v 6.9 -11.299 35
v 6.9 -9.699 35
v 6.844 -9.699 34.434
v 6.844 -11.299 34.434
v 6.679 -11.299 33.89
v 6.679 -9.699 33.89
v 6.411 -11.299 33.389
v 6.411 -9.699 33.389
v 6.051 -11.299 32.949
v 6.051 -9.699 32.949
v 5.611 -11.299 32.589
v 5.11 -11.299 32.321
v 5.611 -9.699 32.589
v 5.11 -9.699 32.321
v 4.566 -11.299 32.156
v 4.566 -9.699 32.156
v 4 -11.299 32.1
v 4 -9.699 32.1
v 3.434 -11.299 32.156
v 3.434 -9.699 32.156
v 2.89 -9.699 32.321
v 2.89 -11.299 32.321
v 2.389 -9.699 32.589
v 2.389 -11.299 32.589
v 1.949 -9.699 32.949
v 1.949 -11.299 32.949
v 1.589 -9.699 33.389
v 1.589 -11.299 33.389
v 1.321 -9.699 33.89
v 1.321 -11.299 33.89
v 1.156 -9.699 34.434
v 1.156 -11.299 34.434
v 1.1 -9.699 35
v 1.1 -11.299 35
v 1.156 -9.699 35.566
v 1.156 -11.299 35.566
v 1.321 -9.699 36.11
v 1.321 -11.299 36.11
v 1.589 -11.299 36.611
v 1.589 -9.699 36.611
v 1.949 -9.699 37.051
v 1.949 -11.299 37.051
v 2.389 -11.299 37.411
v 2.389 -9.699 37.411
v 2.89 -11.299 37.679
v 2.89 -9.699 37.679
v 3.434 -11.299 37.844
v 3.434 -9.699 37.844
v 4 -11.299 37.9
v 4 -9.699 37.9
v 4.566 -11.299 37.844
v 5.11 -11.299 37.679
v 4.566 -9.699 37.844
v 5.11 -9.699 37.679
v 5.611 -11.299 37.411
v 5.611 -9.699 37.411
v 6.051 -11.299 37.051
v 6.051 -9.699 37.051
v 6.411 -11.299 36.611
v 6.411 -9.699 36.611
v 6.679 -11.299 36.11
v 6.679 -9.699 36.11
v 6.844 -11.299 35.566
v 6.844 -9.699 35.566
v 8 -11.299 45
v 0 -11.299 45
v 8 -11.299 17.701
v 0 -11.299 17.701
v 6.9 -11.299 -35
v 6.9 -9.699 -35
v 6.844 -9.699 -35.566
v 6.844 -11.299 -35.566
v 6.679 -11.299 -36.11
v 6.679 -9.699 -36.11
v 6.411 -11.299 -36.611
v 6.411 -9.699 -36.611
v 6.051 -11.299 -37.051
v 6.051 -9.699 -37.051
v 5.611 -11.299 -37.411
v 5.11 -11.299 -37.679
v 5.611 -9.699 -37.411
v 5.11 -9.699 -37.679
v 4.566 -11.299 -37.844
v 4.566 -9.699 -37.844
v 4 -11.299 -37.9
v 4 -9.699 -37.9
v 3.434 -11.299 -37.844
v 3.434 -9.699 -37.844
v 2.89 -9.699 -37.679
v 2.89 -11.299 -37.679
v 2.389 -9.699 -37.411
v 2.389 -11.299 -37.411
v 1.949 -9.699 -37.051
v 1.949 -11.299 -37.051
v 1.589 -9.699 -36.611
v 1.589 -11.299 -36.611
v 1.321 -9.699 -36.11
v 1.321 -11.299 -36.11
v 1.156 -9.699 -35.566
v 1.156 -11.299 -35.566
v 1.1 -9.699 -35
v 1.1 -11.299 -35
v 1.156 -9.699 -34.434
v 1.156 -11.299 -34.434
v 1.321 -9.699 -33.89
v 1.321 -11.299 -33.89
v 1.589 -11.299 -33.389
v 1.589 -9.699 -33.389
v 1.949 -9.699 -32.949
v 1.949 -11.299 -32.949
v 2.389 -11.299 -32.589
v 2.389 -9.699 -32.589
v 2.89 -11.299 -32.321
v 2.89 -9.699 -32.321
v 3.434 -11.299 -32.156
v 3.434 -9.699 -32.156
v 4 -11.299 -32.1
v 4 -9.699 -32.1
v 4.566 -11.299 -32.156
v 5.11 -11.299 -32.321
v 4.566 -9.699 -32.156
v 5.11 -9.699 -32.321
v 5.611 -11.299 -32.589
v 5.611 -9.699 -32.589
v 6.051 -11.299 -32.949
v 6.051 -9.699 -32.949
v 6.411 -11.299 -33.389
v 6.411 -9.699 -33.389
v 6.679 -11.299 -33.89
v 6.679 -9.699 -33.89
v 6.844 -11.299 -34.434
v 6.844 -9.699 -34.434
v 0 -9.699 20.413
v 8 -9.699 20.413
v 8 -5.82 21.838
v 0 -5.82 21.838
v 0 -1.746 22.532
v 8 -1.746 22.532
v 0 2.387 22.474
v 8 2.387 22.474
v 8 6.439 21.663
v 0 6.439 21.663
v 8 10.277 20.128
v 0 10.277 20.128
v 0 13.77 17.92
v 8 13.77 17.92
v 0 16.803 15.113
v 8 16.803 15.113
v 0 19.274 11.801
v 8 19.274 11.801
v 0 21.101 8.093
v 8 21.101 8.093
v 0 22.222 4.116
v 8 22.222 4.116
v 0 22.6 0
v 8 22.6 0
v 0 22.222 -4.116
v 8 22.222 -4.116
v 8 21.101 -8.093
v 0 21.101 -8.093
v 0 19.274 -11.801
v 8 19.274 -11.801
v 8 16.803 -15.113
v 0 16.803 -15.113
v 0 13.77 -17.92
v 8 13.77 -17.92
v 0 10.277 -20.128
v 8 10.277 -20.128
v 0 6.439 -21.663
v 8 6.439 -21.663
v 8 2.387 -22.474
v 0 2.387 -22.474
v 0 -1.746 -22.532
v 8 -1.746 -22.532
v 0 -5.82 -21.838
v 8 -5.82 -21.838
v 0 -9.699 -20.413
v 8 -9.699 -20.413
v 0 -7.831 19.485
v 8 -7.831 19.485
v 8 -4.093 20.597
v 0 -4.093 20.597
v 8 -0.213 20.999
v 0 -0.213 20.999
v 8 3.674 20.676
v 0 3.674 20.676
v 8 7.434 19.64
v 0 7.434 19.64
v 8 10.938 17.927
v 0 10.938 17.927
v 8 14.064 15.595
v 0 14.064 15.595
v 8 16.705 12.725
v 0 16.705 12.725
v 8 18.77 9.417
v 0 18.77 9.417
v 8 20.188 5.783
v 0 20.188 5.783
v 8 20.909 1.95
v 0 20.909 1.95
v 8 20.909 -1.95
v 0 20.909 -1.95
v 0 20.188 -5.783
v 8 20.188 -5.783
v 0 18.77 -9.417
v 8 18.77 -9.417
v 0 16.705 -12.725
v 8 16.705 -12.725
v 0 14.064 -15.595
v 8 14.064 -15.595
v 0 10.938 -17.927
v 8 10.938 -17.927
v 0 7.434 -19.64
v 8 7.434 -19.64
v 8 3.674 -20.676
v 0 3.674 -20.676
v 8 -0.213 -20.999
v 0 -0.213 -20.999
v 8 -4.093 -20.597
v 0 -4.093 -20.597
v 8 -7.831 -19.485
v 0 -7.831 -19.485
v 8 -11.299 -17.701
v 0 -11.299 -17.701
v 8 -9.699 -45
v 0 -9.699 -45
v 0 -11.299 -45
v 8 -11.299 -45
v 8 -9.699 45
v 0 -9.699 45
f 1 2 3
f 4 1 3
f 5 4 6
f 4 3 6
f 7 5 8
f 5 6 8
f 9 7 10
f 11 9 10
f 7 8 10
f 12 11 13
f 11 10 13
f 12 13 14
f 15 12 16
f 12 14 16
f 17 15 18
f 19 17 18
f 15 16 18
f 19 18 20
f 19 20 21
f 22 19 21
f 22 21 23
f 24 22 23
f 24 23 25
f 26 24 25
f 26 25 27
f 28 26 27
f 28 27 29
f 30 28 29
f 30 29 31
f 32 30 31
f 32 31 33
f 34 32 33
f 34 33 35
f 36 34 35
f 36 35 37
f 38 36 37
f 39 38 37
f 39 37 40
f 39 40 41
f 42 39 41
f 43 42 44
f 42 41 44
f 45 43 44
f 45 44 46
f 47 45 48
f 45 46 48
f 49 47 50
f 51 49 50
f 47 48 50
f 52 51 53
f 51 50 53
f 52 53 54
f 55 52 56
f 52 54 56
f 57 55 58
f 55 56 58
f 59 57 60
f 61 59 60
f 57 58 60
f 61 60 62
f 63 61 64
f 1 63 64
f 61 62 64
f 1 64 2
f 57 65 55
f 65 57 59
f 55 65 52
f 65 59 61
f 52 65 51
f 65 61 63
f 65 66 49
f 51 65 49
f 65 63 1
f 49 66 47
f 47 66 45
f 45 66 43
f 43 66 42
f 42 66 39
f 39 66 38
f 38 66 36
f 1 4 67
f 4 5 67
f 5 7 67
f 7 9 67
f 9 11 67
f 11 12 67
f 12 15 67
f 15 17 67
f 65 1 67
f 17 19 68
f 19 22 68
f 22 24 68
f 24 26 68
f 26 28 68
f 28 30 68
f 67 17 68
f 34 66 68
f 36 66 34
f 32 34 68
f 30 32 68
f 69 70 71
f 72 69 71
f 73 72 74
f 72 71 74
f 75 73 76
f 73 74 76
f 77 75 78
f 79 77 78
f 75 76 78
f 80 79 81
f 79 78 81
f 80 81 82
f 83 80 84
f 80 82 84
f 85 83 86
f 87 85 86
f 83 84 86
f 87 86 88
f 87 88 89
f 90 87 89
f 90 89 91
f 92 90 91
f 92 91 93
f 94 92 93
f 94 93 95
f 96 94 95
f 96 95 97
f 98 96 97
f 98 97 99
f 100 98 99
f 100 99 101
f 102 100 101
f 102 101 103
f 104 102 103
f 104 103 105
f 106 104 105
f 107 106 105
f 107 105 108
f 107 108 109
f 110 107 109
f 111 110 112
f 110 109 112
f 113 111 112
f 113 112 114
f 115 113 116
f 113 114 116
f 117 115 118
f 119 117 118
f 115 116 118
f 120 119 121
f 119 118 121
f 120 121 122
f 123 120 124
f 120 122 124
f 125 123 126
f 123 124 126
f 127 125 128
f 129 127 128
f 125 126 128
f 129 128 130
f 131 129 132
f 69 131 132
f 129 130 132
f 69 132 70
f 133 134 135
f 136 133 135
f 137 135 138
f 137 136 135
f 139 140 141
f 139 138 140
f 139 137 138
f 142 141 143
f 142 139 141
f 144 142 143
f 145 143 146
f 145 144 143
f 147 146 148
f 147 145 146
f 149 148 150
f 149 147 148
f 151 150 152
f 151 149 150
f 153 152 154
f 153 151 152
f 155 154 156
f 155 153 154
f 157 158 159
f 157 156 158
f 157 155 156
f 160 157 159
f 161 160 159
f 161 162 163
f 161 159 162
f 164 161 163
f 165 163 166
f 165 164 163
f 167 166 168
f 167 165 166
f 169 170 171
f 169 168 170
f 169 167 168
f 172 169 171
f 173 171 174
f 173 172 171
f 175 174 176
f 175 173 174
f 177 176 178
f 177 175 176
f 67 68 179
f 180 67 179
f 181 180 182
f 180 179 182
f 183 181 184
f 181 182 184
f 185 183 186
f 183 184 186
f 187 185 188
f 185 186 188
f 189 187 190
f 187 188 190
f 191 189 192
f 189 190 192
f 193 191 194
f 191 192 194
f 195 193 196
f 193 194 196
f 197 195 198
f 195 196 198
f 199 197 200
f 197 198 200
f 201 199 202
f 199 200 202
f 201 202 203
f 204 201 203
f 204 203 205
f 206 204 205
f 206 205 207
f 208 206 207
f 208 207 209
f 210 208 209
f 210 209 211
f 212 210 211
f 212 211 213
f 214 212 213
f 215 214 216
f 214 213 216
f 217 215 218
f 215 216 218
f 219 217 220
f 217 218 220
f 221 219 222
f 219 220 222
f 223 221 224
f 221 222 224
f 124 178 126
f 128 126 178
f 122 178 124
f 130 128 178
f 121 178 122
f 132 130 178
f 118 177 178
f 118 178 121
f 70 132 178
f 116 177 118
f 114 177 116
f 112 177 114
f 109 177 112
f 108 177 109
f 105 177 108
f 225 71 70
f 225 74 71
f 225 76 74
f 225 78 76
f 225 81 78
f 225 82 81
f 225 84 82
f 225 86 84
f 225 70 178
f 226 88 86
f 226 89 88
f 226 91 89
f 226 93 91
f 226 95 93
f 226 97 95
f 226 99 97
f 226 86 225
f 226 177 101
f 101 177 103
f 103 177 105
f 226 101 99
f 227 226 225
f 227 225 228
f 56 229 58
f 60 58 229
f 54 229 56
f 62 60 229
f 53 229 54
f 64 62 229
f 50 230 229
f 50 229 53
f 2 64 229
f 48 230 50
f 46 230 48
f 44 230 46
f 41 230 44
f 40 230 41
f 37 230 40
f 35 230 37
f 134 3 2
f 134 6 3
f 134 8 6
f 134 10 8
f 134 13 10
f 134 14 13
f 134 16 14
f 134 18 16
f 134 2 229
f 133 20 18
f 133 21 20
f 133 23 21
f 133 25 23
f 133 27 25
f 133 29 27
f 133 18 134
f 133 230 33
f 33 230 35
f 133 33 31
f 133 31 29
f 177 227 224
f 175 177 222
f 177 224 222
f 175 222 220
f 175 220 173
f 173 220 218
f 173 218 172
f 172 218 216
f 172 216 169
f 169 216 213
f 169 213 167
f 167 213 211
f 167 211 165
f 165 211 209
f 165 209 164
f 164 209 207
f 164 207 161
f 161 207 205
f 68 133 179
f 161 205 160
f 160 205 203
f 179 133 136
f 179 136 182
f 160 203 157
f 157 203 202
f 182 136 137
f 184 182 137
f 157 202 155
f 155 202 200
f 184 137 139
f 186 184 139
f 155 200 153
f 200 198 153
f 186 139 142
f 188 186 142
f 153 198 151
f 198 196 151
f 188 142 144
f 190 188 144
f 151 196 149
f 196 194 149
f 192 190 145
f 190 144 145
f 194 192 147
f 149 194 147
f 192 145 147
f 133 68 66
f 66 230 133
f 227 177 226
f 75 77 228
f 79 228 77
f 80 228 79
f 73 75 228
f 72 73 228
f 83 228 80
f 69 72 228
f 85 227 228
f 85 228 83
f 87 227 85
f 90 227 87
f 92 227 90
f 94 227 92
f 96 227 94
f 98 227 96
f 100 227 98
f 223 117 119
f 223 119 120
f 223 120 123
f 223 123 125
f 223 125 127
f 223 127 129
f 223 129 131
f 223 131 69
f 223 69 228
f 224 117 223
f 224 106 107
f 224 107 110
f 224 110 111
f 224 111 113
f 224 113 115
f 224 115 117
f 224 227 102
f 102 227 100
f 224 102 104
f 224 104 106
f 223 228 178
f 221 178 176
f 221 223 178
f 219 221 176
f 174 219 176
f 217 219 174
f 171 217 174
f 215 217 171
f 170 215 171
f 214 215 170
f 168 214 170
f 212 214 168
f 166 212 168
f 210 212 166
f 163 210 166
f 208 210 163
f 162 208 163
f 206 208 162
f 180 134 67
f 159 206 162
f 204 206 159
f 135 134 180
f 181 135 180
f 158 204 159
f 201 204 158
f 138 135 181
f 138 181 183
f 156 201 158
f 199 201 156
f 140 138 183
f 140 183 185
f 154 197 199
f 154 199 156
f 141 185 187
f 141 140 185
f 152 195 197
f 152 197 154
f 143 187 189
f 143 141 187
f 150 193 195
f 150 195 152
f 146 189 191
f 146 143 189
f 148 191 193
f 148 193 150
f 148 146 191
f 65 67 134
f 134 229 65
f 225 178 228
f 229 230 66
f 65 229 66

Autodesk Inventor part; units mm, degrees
ref_plane "YZ Plane" through (0, 0, 0) normal (1, 0, 0) x (0, 1, 0)
ref_plane "XZ Plane" through (0, 0, 0) normal (0, 1, 0) x (-1, 0, 0)
ref_plane "XY Plane" through (0, 0, 0) normal (0, 0, 1) x (1, 0, 0)
sketch "Sketch9" plane through (0, 0, 0) normal (1, 0, 0) x (0, 1, 0)
  arc A0 (-11.2991, -17.7011) -> (-11.2991, 17.7011) centre (0, 0) ccw
  arc A1 (-9.6991, -20.4129) -> (-9.6991, 20.4129) centre (0, 0) ccw
  line L0 (-9.6991, 45) -> (-11.2991, 45)
  line L1 (-11.2991, 45) -> (-11.2991, 17.7011)
  line L2 (-9.6991, 0) -> (-16.1126, 0) construction
  line L3 (-9.6991, -45) -> (-11.2991, -45)
  line L4 (-11.2991, -45) -> (-11.2991, -17.7011)
  line L5 (-9.6991, 45) -> (-9.6991, 18.626)
  line L6 (-9.6991, -18.626) -> (-9.6991, -45)
  dimension "d36" = 42
  dimension "d37" = 45.2
  dimension "d38" = 90
  dimension "d39" = 45
  dimension "d40" = 1.6
extrude "Extrusion5" add sketch "Sketch9" along normal blind 8
sketch "Sketch10" plane through (0, -9.6991, 45) normal (0, 1, 0) x (1, 0, 0)
  circle A0 centre (4, 10) radius 2.9
  circle A1 centre (4, 80) radius 2.9
  line L0 (0, 0) -> (8, 0) projected
  line L1 (0, 90) -> (8, 90) projected
  line L2 (8, 90) -> (8, 65.4129) projected
  line L3 (0, 24.5871) -> (0, 0) projected
  point P0 (0, 45)
  dimension "d43" = 5.8
  dimension "d44" = 5.8
  dimension "d45" = 10
  dimension "d46" = 10
  dimension "d47" = 4
  dimension "d48" = 4
extrude "Extrusion6" cut sketch "Sketch10" against normal through all
